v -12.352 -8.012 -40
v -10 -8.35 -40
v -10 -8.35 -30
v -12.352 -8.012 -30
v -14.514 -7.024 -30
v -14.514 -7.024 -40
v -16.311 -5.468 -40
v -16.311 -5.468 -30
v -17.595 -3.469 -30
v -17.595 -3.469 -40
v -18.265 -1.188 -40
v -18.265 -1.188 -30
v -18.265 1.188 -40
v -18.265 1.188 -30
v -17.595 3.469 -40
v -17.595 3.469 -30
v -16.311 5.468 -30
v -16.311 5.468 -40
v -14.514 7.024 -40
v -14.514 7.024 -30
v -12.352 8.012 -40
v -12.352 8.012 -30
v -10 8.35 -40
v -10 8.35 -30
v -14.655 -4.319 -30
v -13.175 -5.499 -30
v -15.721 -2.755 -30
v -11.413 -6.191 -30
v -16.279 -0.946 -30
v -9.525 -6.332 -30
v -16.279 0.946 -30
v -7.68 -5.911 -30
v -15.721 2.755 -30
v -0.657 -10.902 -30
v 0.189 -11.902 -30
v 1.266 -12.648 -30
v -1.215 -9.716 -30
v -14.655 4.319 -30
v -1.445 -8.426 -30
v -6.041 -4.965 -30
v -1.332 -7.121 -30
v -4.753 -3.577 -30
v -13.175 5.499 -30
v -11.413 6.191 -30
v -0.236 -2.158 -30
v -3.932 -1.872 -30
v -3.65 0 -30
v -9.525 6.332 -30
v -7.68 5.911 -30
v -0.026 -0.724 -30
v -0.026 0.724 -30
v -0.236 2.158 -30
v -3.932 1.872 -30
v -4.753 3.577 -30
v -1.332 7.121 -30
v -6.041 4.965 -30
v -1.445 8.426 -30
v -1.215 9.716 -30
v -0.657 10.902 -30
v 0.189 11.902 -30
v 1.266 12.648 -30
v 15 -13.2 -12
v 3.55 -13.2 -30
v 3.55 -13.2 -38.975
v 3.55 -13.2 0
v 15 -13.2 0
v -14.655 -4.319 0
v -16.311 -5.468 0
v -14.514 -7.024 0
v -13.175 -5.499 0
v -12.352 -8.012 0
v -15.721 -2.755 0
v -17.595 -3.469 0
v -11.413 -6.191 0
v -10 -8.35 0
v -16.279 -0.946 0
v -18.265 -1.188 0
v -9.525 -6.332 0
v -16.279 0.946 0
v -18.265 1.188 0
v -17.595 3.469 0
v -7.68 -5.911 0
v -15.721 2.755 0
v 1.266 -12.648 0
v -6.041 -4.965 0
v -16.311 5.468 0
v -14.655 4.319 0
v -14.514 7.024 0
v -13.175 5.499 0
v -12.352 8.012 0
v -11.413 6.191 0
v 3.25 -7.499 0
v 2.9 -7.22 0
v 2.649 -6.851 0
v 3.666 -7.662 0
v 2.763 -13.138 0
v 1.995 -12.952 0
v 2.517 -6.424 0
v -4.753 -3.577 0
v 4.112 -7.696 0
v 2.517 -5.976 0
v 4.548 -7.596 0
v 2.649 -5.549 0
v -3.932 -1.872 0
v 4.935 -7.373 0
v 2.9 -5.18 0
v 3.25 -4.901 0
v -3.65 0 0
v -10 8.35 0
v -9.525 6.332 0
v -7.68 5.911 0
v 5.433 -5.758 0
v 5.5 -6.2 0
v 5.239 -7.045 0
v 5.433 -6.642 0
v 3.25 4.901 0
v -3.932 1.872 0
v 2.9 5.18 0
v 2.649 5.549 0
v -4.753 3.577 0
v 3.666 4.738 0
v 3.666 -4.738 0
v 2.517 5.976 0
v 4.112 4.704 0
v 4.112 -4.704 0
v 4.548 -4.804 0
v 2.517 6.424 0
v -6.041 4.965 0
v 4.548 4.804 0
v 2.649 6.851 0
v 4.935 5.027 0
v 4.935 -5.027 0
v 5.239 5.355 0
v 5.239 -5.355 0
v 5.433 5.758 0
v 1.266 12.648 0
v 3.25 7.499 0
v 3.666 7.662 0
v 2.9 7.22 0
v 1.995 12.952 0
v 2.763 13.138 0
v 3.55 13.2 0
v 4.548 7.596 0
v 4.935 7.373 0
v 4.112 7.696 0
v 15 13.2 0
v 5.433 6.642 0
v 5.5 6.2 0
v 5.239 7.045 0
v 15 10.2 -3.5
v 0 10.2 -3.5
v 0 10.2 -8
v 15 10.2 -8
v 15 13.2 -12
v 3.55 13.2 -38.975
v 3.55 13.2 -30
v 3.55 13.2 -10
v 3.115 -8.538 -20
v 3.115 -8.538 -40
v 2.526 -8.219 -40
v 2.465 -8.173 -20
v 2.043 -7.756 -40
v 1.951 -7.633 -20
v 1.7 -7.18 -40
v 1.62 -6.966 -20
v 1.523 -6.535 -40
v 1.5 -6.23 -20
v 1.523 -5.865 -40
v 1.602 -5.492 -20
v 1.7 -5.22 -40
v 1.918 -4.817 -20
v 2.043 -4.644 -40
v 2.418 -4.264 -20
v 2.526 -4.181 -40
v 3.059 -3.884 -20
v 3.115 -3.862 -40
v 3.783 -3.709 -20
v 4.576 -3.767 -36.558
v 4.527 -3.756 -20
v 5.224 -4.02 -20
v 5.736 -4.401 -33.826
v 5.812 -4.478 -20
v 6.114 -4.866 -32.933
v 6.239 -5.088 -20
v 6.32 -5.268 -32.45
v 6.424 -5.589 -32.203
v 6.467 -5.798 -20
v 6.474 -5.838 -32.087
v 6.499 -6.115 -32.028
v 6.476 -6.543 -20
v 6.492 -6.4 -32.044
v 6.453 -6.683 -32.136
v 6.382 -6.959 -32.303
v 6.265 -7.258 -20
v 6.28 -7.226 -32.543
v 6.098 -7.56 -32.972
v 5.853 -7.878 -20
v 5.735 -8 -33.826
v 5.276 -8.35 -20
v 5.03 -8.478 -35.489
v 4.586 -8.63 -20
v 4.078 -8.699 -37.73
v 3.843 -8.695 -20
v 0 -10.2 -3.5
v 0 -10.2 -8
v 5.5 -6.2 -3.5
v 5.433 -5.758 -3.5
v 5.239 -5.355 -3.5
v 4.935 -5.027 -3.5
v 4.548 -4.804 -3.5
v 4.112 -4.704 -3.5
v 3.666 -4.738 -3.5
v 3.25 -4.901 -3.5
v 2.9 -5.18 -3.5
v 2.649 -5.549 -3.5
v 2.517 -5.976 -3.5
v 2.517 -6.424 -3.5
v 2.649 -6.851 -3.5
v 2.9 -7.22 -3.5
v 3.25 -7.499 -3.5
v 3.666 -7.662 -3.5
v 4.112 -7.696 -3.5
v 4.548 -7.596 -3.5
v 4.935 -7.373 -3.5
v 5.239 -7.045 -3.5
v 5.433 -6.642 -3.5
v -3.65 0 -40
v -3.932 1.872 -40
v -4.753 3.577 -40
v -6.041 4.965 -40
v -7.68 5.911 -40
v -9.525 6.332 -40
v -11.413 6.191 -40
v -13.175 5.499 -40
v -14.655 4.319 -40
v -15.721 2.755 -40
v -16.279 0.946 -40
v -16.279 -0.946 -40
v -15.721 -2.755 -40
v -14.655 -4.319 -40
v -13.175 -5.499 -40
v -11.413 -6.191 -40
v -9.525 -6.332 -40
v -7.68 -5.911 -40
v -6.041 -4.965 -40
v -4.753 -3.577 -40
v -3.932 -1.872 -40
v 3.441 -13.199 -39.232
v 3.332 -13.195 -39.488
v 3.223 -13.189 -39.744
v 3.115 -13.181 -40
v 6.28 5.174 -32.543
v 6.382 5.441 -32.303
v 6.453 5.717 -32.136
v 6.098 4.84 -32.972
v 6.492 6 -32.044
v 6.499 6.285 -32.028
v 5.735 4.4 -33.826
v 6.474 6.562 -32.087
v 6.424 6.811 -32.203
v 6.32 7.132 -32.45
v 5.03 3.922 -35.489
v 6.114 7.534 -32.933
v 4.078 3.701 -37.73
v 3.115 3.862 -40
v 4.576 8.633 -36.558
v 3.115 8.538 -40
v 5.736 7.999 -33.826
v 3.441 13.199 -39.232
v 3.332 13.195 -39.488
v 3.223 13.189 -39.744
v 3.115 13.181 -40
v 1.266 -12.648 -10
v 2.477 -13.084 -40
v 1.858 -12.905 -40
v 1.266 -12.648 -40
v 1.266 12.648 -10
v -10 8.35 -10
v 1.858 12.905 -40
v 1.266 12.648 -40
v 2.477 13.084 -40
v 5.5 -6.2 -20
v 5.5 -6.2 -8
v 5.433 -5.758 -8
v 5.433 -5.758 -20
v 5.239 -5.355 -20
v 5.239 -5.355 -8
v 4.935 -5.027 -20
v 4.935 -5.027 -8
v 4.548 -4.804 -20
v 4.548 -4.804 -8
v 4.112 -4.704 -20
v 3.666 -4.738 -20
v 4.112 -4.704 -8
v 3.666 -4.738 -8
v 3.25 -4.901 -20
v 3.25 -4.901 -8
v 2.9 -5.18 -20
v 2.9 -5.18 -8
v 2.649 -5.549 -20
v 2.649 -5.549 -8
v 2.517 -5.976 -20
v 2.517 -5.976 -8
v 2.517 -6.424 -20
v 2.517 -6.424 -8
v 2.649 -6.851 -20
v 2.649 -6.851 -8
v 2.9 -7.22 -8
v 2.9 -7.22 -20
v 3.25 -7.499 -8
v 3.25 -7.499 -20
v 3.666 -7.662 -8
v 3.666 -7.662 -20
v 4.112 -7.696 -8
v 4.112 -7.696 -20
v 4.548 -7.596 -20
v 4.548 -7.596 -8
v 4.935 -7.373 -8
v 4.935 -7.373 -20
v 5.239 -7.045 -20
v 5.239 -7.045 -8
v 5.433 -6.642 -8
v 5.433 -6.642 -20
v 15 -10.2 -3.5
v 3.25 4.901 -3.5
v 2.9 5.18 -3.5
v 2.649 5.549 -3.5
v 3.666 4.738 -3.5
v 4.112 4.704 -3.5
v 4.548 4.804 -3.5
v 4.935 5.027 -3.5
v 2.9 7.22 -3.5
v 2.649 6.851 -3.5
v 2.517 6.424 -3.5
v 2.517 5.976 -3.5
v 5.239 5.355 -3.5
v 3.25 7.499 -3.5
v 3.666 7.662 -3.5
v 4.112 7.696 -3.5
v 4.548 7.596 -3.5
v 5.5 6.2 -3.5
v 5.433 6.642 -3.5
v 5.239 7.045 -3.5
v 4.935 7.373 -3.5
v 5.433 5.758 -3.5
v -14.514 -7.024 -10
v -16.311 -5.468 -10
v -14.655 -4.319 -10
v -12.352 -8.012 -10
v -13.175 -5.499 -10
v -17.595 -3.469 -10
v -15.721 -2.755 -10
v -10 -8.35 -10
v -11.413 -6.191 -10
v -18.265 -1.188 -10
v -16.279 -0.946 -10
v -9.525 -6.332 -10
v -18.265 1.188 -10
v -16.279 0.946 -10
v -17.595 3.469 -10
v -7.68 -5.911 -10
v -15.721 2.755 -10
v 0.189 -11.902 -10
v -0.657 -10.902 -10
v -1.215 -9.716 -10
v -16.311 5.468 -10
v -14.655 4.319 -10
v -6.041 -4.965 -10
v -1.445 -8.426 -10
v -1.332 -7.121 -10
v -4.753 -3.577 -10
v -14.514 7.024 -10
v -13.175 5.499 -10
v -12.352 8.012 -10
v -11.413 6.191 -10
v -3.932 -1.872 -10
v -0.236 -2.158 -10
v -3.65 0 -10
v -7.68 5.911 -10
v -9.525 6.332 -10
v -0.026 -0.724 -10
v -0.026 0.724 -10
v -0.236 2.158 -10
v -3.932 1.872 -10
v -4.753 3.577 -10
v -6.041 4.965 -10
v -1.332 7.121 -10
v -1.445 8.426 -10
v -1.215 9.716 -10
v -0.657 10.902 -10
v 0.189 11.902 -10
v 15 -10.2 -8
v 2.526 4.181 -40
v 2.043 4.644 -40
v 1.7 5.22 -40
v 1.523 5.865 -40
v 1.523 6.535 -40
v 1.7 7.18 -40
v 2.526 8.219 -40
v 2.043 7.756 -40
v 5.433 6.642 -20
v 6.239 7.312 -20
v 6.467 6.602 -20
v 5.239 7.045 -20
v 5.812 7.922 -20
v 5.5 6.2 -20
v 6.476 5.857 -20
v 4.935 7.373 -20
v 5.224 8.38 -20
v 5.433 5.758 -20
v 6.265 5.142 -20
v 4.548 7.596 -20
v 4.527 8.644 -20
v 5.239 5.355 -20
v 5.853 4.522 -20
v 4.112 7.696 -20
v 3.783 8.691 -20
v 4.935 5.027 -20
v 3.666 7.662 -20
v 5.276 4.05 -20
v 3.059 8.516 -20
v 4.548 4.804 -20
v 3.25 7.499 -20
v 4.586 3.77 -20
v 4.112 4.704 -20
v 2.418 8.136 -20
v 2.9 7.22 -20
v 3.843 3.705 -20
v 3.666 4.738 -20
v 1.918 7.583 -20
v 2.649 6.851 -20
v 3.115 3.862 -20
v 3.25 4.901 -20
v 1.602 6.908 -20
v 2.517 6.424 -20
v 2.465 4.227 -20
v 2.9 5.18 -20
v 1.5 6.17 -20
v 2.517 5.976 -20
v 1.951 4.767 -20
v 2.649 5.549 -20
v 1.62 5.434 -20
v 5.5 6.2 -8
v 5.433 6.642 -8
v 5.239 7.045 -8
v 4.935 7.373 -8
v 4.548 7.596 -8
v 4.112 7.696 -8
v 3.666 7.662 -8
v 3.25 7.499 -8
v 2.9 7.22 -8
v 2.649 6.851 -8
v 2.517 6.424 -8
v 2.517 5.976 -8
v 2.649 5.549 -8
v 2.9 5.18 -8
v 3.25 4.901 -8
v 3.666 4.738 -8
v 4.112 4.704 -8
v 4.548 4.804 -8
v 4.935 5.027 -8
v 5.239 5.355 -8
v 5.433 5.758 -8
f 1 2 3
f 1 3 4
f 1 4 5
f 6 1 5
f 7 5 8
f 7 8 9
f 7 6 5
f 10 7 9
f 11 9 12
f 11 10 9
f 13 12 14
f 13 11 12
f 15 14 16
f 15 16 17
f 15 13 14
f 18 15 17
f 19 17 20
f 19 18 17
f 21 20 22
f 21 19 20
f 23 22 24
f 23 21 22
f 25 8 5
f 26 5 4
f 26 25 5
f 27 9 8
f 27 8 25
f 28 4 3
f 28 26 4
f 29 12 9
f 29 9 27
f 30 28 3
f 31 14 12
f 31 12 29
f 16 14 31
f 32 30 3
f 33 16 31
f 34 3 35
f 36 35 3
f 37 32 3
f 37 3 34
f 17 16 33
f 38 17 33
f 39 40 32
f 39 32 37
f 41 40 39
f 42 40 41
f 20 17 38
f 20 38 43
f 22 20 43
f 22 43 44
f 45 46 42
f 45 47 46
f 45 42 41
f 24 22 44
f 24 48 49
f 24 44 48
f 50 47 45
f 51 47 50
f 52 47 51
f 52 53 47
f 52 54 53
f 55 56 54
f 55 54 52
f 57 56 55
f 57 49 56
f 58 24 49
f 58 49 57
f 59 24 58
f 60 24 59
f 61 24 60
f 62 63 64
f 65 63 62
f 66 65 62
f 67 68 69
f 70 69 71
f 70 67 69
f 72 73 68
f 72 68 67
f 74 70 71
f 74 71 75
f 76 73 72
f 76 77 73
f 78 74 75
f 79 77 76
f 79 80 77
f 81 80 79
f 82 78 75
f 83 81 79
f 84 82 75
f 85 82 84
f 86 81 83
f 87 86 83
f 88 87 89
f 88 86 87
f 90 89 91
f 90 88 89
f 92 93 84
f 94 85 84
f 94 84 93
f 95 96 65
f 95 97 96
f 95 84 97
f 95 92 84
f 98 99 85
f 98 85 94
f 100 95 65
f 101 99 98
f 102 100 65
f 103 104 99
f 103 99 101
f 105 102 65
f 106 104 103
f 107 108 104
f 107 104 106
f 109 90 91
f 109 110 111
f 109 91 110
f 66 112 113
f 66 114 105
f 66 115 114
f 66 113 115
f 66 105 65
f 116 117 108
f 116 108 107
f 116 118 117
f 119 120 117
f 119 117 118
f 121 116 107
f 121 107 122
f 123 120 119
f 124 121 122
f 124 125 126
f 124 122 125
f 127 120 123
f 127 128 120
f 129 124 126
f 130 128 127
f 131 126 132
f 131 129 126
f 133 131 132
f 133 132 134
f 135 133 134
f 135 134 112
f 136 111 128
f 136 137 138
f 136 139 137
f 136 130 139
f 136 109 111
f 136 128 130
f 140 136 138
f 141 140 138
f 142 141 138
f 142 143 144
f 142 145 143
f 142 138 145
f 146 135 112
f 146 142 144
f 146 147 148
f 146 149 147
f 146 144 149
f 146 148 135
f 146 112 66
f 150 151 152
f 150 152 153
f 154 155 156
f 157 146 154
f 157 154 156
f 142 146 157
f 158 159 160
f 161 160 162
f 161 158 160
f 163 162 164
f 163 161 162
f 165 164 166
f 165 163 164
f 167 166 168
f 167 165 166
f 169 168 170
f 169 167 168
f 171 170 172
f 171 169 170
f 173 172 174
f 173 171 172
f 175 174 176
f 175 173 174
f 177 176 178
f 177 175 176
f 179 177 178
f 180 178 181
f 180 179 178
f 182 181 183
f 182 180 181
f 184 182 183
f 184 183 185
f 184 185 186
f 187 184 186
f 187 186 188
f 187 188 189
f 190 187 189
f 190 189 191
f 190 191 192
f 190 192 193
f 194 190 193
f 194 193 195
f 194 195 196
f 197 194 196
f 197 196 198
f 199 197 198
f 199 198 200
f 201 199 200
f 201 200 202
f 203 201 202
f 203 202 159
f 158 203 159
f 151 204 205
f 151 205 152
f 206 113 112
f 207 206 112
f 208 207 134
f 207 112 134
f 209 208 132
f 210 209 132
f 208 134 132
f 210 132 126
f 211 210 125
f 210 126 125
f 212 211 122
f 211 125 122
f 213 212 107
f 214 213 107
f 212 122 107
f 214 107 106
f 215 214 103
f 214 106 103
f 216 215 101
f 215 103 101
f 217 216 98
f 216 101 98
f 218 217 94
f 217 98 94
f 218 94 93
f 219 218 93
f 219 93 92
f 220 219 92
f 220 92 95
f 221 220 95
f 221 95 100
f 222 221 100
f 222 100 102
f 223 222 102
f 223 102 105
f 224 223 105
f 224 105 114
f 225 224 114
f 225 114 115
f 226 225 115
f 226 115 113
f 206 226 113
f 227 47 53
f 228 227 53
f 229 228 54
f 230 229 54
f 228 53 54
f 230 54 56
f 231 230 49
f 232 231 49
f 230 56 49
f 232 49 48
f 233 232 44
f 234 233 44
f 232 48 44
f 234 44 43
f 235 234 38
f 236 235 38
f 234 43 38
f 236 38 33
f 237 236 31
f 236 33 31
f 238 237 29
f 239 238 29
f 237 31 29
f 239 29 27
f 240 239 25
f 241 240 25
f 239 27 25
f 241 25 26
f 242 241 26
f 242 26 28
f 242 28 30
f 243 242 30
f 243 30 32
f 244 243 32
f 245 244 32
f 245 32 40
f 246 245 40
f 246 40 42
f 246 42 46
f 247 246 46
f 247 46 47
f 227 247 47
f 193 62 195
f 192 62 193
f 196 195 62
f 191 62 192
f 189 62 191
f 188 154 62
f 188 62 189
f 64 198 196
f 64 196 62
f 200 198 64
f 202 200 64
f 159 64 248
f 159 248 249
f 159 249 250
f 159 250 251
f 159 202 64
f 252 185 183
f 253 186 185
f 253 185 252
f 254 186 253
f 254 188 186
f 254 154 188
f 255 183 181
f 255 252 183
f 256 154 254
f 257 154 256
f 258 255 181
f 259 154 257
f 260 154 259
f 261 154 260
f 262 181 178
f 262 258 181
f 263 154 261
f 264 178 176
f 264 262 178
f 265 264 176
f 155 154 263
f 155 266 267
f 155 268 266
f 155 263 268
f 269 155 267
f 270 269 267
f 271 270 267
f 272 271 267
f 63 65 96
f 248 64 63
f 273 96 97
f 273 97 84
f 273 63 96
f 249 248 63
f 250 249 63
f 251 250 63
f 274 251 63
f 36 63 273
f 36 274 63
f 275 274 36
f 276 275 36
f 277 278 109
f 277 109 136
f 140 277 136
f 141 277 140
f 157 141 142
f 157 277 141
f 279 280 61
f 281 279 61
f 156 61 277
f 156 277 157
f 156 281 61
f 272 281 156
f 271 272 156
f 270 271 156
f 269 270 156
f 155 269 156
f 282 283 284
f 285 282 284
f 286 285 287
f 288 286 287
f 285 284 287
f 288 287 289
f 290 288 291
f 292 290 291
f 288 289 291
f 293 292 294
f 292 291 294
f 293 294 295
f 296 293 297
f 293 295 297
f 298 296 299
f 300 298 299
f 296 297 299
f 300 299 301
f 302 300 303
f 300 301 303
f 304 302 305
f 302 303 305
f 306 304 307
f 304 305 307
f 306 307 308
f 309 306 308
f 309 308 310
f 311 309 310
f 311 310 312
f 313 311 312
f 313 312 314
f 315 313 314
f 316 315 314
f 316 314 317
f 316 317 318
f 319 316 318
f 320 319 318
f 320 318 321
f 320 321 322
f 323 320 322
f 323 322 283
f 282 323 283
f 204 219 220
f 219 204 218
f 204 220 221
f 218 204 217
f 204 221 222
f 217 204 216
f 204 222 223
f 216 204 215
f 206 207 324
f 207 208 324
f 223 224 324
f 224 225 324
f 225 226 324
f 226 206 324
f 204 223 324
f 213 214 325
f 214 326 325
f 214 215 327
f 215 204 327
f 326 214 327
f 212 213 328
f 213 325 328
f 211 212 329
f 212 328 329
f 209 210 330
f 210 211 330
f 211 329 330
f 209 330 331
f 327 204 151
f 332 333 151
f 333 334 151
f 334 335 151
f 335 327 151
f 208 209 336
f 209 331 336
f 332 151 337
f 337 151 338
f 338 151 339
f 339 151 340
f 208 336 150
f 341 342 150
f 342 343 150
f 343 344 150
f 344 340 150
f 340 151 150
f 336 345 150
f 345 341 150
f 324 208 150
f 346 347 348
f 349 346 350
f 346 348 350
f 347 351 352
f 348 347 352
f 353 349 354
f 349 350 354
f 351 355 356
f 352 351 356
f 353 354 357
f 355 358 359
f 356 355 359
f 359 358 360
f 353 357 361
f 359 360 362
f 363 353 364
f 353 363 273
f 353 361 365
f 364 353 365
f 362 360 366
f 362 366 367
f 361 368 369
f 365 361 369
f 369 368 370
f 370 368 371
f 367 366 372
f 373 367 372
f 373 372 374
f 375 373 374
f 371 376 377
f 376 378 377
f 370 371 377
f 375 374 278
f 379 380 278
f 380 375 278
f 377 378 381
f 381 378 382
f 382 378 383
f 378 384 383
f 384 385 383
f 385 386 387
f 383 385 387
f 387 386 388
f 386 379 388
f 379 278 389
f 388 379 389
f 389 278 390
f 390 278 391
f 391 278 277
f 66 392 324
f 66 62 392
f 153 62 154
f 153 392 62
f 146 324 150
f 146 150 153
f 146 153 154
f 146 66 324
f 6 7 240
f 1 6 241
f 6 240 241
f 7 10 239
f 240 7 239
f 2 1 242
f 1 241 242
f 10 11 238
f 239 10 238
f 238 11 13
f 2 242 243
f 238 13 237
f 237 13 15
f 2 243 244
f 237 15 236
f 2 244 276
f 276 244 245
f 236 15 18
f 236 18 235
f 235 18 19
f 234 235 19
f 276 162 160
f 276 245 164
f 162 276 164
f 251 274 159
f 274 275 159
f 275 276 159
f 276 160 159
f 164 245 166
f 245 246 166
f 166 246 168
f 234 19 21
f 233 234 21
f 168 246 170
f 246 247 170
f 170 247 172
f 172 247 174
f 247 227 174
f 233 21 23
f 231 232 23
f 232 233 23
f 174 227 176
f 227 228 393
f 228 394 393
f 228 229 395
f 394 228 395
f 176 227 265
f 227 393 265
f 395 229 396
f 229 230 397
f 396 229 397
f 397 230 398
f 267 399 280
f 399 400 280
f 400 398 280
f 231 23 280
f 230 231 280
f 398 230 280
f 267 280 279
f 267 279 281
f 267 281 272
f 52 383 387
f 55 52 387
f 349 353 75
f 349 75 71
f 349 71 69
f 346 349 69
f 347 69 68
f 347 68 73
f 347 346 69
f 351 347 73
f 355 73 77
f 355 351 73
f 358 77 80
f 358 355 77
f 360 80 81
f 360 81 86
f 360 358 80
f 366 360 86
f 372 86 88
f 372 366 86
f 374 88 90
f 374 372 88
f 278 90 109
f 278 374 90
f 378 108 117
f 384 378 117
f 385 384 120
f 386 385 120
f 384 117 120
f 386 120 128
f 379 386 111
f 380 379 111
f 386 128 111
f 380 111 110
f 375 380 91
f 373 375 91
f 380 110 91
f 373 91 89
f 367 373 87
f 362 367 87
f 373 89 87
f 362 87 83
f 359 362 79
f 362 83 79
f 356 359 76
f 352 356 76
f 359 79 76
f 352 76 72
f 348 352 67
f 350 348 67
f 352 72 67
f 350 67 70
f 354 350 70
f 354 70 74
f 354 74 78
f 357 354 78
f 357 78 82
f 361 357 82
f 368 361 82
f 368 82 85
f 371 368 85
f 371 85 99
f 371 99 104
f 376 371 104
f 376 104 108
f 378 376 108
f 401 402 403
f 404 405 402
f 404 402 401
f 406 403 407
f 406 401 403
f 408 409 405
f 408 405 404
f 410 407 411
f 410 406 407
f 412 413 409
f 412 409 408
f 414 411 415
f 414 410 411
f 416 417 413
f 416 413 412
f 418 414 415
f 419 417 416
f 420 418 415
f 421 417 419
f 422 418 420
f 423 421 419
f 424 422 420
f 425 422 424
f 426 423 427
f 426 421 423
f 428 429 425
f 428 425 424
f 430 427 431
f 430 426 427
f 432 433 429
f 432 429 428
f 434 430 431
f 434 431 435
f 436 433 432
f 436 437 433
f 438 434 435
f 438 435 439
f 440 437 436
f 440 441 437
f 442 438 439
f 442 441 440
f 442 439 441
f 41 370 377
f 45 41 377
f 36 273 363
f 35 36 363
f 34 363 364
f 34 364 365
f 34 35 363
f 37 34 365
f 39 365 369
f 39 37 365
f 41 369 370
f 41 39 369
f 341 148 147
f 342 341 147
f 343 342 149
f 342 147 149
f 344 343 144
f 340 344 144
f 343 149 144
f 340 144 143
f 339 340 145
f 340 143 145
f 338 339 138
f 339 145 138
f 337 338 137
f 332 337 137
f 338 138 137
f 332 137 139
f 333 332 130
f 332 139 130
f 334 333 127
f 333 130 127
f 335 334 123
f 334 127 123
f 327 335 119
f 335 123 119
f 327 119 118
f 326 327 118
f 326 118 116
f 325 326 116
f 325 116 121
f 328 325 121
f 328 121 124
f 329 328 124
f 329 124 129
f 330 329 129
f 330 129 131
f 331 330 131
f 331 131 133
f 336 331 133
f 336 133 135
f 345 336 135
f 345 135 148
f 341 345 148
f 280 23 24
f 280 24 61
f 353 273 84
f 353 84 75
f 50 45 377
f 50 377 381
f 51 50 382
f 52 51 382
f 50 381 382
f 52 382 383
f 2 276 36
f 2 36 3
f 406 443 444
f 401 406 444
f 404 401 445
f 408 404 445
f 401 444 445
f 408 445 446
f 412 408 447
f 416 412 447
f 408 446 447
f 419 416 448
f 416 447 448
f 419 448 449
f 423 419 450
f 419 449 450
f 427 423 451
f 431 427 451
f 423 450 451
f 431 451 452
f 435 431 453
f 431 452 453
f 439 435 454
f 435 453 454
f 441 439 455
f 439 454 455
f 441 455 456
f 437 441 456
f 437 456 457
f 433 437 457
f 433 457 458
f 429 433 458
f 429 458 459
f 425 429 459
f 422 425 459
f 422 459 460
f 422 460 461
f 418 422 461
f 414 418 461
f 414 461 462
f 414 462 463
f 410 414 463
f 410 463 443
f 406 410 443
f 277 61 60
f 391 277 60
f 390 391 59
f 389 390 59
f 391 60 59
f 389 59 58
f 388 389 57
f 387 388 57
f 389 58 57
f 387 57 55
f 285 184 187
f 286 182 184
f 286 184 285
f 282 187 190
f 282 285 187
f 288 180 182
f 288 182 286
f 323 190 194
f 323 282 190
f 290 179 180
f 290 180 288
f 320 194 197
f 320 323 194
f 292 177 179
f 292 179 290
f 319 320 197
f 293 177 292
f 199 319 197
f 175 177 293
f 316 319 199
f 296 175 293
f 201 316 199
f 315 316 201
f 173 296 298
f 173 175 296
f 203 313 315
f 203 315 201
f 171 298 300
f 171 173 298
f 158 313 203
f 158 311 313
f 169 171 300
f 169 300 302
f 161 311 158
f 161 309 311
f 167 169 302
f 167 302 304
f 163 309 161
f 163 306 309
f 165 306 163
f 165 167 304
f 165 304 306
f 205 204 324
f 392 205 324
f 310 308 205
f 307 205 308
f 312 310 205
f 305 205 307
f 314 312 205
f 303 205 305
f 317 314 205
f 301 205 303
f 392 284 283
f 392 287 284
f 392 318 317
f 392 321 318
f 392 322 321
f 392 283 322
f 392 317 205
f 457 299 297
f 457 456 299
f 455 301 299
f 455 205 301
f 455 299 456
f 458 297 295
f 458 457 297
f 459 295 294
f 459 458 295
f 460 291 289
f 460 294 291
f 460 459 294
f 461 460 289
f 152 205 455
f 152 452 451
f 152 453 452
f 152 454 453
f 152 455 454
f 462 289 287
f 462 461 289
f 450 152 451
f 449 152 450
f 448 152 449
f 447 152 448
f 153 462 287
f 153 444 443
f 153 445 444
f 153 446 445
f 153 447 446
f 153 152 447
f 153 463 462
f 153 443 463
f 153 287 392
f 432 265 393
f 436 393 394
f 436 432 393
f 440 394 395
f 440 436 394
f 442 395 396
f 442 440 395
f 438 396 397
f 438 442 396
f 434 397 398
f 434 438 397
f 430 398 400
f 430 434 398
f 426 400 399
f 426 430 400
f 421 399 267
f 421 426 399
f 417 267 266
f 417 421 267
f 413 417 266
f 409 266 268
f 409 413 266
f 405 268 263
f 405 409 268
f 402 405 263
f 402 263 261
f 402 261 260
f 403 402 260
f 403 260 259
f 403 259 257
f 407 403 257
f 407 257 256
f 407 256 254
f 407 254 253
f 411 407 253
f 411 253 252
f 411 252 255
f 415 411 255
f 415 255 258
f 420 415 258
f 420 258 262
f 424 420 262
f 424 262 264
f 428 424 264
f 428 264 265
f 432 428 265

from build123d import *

# Parameters (mm, degrees)
SKETCH1_R               = 6.35
SKETCH1_W               = 15
SKETCH1_H               = 20.4
SKETCH1_R_2             = 1.5
BOSS_EXTRUDE1_DEPTH     = 40
CUT_EXTRUDE1_START      = -3.5
SKETCH1_7_W             = 15
SKETCH1_7_H             = 20.4
SKETCH1_7_R             = 1.5
CUT_EXTRUDE1_DEPTH      = 4.5
CUT_EXTRUDE2_START      = -10
CUT_EXTRUDE2_DEPTH      = 20
FILLET1_R               = 5
CUT_EXTRUDE3_DEPTH      = 39.804456485
CUT_EXTRUDE3_DEPTH_BACK = 39.804456485
CHAMFER1_SIZE           = 28
CHAMFER1_SIZE_2         = 11.885294854
CUT_EXTRUDE5_DEPTH      = 46.945211938
CUT_EXTRUDE5_DEPTH_BACK = 20
SKETCH5_R               = 2.5


with BuildPart() as part:
    # Sketch1 → Boss-Extrude1 (new body)
    # profile 1 of 2: a face of its own
    with BuildSketch(Plane.XY):
        Polygon((-20.773681501, -13.2), (-15, -13.2), (15, -13.2), (15, -10.2), (0, -10.2), (0, 10.2), (15, 10.2), (15, 13.2), (-14.707827622, 13.2), (-15, 13.2), (-20.773681501, 13.2), align=None)
        with Locations((-10, 0)):
            Circle(SKETCH1_R, mode=Mode.SUBTRACT)
    # profile 2 of 2: a face of its own
    with BuildSketch(Plane.XY):
        with Locations((7.5, 0)):
            Rectangle(SKETCH1_W, SKETCH1_H)
        with Locations((4, -6.2)):
            Circle(SKETCH1_R_2, mode=Mode.SUBTRACT)
        with Locations((4, 6.2)):
            Circle(SKETCH1_R_2, mode=Mode.SUBTRACT)
    extrude(amount=-BOSS_EXTRUDE1_DEPTH)

    # Sketch1<7> → Cut-Extrude1 (cut)
    with BuildSketch(Plane.XY.offset(CUT_EXTRUDE1_START)):
        with Locations((7.5, 0)):
            Rectangle(SKETCH1_7_W, SKETCH1_7_H)
        with Locations((4, -6.2)):
            Circle(SKETCH1_7_R, mode=Mode.SUBTRACT)
        with Locations((4, 6.2)):
            Circle(SKETCH1_7_R, mode=Mode.SUBTRACT)
    extrude(amount=-CUT_EXTRUDE1_DEPTH, mode=Mode.SUBTRACT)

    # Sketch2 → Cut-Extrude2 (cut)
    with BuildSketch(Plane.XY.offset(CUT_EXTRUDE2_START)):
        with BuildLine():
            Line((-0.235583945, 2.157818136), (-2.675772908, 13.2))
            Line((-2.675772908, 13.2), (-11.927619652, 13.2))
            Line((-11.927619652, 13.2), (-20.773681501, 13.2))
            Line((-20.773681501, 13.2), (-20.773681501, -13.2))
            Line((-20.773681501, -13.2), (-2.675772908, -13.2))
            Line((-2.675772908, -13.2), (-0.235583945, -2.157818136))
            ThreePointArc((-0.235583945, -2.157818136), (0, 0), (-0.235583945, 2.157818136))
        make_face()
    extrude(amount=-CUT_EXTRUDE2_DEPTH, mode=Mode.SUBTRACT)

    # Fillet1
    fillet1_edges = [part.edges().sort_by_distance(p)[0] for p in [
        (-2.675772908, 13.2, -20),
        (-2.675772908, -13.2, -20),
    ]]
    fillet(fillet1_edges, radius=FILLET1_R)

    # Sketch3 → Cut-Extrude3 (cut, two sides: drawn at the far end of the back side and taken through both)
    with BuildSketch(Plane.XY.offset(-30).offset(-CUT_EXTRUDE3_DEPTH_BACK)):
        with BuildLine():
            Line((-10, 8.35), (1.266113946, 12.648007971))
            ThreePointArc((1.266113946, 12.648007971), (2.375075148, 13.060043202), (3.549800678, 13.2))
            Line((3.549800678, 13.2), (-20.773681501, 13.2))
            Line((-20.773681501, 13.2), (-20.773681501, -13.2))
            Line((-20.773681501, -13.2), (3.549800678, -13.2))
            ThreePointArc((3.549800678, -13.2), (2.375075148, -13.060043202), (1.266113946, -12.648007971))
            Line((1.266113946, -12.648007971), (-10, -8.35))
            ThreePointArc((-10, -8.35), (-18.35, 0), (-10, 8.35))
        make_face()
    extrude(amount=CUT_EXTRUDE3_DEPTH + CUT_EXTRUDE3_DEPTH_BACK, mode=Mode.SUBTRACT)

    # Chamfer1
    # the kernel refuses this chamfer: 28, 11.885294854 mm, written as the material it takes off along each edge
    with BuildSketch(Plane(origin=(15, 85.785659069, -40), x_dir=(0.01507249742986372, 0, 0.9998864034585262), z_dir=(0, -1, 0))) as chamfer1_piece_1:
        Polygon((CHAMFER1_SIZE * 0.999886403459, CHAMFER1_SIZE * 0.0150724974299), (-CHAMFER1_SIZE_2 * 0.0150724974297, CHAMFER1_SIZE_2 * 0.999886403448), (0, 0), align=None)
    extrude(amount=171.571318139, mode=Mode.SUBTRACT)

    # Sketch5 → Cut-Extrude5 (cut, two sides: drawn at the far end of the back side and taken through both)
    with BuildSketch(Plane(origin=(0, 0, -40), x_dir=(-1, 0, 0), z_dir=(0, 0, -1)).offset(-CUT_EXTRUDE5_DEPTH_BACK)):
        with Locations(Location((-4, 6.2, 0), (0, 0, 290.739394744))):
            Circle(SKETCH5_R)
        with Locations(Location((-4, -6.2, 0), (0, 0, 290.739394744))):
            Circle(SKETCH5_R)
    extrude(amount=CUT_EXTRUDE5_DEPTH + CUT_EXTRUDE5_DEPTH_BACK, mode=Mode.SUBTRACT)


solid = part.part
